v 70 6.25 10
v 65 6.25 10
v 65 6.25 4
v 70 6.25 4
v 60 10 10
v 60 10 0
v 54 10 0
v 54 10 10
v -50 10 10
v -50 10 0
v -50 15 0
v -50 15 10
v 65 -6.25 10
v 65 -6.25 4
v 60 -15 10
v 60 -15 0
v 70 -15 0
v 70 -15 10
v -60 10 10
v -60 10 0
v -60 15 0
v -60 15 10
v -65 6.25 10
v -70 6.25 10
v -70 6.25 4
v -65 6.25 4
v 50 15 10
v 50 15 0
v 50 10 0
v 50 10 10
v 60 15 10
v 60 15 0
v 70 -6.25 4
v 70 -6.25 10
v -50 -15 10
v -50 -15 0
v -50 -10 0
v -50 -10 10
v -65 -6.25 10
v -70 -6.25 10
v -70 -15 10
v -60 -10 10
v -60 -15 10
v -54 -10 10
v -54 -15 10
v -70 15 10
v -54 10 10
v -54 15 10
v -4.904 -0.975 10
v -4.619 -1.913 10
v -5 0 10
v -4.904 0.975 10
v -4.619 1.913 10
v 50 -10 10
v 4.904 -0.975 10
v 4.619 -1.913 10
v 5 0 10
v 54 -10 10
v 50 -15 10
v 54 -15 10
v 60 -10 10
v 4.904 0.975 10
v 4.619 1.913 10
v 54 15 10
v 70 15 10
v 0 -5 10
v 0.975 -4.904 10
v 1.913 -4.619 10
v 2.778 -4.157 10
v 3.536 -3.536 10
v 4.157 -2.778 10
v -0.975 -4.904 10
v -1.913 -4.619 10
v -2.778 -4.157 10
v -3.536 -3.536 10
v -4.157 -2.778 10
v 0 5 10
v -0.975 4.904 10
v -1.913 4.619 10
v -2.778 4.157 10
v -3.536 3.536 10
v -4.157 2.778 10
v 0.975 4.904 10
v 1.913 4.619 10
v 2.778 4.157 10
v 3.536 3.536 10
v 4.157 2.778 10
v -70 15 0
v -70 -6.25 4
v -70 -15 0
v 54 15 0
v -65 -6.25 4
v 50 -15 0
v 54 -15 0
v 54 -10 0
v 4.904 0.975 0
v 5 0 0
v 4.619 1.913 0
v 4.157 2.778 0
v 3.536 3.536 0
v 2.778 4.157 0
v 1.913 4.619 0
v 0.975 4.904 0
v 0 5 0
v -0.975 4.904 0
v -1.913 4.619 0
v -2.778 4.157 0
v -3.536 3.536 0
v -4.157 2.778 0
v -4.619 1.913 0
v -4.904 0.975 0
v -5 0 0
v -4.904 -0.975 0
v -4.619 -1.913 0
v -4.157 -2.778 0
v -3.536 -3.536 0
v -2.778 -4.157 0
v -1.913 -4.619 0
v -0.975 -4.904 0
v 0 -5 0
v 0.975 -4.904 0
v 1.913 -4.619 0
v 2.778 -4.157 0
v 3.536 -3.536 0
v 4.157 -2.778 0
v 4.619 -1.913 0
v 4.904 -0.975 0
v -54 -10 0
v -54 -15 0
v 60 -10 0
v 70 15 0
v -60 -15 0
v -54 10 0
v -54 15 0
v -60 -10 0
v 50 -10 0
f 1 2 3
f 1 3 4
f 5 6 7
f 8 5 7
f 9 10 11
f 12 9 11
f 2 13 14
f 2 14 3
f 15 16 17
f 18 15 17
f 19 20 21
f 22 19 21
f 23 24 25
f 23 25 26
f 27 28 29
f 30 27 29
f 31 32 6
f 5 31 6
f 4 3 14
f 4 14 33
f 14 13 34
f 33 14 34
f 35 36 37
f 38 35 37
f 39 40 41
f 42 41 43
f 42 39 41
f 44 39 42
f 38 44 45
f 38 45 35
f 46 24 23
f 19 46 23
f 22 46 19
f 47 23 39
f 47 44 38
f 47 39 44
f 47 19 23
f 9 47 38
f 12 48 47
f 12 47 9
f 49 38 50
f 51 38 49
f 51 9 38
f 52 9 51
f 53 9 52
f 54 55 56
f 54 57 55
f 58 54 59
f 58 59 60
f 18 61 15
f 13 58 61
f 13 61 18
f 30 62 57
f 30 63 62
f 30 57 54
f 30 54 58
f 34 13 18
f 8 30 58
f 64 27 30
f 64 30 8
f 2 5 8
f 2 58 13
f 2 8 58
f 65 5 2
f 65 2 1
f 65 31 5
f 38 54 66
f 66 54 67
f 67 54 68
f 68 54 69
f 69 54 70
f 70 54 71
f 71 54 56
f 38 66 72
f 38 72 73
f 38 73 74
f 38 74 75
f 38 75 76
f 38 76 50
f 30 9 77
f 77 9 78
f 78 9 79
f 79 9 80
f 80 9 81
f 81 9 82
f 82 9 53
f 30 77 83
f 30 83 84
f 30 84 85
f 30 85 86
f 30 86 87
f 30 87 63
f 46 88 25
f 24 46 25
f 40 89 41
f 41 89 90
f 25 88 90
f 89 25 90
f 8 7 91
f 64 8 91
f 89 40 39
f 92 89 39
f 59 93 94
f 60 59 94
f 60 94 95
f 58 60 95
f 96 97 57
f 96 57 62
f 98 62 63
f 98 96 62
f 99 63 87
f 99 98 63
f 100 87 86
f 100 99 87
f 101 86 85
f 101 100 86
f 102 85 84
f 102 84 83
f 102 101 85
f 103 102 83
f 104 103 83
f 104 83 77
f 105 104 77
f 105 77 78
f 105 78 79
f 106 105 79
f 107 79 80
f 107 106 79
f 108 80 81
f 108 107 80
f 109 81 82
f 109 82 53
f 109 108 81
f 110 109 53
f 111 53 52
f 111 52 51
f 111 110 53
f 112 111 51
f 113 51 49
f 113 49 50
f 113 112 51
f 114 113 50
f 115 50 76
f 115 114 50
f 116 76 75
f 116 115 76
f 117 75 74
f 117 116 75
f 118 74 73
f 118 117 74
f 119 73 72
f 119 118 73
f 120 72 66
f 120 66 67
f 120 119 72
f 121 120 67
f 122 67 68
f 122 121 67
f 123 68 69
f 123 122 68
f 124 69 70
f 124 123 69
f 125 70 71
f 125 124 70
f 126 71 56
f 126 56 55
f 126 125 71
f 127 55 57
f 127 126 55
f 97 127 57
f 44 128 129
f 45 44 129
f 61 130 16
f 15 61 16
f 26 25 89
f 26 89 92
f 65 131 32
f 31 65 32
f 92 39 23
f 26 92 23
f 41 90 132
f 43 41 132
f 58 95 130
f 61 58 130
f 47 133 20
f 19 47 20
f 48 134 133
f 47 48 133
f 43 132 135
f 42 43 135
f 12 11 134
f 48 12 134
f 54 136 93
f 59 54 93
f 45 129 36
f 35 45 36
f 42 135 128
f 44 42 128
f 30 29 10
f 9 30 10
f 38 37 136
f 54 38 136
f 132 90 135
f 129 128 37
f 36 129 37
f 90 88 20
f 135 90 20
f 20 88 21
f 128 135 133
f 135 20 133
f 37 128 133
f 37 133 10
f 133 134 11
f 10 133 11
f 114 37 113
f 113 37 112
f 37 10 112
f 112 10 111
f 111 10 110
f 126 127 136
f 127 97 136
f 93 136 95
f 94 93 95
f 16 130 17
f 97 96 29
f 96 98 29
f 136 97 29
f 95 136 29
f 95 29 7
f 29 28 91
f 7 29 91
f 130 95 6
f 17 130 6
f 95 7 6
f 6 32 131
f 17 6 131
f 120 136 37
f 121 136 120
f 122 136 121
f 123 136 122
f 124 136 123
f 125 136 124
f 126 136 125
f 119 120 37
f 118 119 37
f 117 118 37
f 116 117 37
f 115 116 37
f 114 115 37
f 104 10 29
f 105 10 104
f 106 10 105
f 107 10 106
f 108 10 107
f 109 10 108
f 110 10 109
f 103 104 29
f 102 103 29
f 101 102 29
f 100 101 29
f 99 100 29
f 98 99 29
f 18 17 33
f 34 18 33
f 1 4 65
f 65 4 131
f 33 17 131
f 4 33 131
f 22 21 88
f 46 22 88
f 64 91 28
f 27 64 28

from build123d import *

# Parameters (mm, degrees)
F0_R     = 5
F1_DEPTH = 10
F2_W     = 10
F2_H     = 12.5
F3_DEPTH = 6


with BuildPart() as f1:
    # F0 (on Top) → F1 (new body)
    with BuildSketch(Plane.XY):
        Polygon((-50, -10), (50, -10), (50, -15), (54, -15), (54, -10), (60, -10), (60, -15), (70, -15), (70, 0), (70, 15), (60, 15), (60, 10), (54, 10), (54, 15), (50, 15), (50, 10), (-50, 10), (-50, 15), (-54, 15), (-54, 10), (-60, 10), (-60, 15), (-70, 15), (-70, 0), (-70, -15), (-60, -15), (-60, -10), (-54, -10), (-54, -15), (-50, -15), align=None)
        Circle(F0_R, mode=Mode.SUBTRACT)
    extrude(amount=F1_DEPTH)

    # F2 (on face) → F3 (cut)
    with BuildSketch(Plane.XY.offset(10)):
        with Locations((70, 0)):
            Rectangle(F2_W, F2_H)
        with Locations((-70, 0)):
            Rectangle(F2_W, F2_H)
    extrude(amount=-F3_DEPTH, mode=Mode.SUBTRACT)


solid = f1.part
